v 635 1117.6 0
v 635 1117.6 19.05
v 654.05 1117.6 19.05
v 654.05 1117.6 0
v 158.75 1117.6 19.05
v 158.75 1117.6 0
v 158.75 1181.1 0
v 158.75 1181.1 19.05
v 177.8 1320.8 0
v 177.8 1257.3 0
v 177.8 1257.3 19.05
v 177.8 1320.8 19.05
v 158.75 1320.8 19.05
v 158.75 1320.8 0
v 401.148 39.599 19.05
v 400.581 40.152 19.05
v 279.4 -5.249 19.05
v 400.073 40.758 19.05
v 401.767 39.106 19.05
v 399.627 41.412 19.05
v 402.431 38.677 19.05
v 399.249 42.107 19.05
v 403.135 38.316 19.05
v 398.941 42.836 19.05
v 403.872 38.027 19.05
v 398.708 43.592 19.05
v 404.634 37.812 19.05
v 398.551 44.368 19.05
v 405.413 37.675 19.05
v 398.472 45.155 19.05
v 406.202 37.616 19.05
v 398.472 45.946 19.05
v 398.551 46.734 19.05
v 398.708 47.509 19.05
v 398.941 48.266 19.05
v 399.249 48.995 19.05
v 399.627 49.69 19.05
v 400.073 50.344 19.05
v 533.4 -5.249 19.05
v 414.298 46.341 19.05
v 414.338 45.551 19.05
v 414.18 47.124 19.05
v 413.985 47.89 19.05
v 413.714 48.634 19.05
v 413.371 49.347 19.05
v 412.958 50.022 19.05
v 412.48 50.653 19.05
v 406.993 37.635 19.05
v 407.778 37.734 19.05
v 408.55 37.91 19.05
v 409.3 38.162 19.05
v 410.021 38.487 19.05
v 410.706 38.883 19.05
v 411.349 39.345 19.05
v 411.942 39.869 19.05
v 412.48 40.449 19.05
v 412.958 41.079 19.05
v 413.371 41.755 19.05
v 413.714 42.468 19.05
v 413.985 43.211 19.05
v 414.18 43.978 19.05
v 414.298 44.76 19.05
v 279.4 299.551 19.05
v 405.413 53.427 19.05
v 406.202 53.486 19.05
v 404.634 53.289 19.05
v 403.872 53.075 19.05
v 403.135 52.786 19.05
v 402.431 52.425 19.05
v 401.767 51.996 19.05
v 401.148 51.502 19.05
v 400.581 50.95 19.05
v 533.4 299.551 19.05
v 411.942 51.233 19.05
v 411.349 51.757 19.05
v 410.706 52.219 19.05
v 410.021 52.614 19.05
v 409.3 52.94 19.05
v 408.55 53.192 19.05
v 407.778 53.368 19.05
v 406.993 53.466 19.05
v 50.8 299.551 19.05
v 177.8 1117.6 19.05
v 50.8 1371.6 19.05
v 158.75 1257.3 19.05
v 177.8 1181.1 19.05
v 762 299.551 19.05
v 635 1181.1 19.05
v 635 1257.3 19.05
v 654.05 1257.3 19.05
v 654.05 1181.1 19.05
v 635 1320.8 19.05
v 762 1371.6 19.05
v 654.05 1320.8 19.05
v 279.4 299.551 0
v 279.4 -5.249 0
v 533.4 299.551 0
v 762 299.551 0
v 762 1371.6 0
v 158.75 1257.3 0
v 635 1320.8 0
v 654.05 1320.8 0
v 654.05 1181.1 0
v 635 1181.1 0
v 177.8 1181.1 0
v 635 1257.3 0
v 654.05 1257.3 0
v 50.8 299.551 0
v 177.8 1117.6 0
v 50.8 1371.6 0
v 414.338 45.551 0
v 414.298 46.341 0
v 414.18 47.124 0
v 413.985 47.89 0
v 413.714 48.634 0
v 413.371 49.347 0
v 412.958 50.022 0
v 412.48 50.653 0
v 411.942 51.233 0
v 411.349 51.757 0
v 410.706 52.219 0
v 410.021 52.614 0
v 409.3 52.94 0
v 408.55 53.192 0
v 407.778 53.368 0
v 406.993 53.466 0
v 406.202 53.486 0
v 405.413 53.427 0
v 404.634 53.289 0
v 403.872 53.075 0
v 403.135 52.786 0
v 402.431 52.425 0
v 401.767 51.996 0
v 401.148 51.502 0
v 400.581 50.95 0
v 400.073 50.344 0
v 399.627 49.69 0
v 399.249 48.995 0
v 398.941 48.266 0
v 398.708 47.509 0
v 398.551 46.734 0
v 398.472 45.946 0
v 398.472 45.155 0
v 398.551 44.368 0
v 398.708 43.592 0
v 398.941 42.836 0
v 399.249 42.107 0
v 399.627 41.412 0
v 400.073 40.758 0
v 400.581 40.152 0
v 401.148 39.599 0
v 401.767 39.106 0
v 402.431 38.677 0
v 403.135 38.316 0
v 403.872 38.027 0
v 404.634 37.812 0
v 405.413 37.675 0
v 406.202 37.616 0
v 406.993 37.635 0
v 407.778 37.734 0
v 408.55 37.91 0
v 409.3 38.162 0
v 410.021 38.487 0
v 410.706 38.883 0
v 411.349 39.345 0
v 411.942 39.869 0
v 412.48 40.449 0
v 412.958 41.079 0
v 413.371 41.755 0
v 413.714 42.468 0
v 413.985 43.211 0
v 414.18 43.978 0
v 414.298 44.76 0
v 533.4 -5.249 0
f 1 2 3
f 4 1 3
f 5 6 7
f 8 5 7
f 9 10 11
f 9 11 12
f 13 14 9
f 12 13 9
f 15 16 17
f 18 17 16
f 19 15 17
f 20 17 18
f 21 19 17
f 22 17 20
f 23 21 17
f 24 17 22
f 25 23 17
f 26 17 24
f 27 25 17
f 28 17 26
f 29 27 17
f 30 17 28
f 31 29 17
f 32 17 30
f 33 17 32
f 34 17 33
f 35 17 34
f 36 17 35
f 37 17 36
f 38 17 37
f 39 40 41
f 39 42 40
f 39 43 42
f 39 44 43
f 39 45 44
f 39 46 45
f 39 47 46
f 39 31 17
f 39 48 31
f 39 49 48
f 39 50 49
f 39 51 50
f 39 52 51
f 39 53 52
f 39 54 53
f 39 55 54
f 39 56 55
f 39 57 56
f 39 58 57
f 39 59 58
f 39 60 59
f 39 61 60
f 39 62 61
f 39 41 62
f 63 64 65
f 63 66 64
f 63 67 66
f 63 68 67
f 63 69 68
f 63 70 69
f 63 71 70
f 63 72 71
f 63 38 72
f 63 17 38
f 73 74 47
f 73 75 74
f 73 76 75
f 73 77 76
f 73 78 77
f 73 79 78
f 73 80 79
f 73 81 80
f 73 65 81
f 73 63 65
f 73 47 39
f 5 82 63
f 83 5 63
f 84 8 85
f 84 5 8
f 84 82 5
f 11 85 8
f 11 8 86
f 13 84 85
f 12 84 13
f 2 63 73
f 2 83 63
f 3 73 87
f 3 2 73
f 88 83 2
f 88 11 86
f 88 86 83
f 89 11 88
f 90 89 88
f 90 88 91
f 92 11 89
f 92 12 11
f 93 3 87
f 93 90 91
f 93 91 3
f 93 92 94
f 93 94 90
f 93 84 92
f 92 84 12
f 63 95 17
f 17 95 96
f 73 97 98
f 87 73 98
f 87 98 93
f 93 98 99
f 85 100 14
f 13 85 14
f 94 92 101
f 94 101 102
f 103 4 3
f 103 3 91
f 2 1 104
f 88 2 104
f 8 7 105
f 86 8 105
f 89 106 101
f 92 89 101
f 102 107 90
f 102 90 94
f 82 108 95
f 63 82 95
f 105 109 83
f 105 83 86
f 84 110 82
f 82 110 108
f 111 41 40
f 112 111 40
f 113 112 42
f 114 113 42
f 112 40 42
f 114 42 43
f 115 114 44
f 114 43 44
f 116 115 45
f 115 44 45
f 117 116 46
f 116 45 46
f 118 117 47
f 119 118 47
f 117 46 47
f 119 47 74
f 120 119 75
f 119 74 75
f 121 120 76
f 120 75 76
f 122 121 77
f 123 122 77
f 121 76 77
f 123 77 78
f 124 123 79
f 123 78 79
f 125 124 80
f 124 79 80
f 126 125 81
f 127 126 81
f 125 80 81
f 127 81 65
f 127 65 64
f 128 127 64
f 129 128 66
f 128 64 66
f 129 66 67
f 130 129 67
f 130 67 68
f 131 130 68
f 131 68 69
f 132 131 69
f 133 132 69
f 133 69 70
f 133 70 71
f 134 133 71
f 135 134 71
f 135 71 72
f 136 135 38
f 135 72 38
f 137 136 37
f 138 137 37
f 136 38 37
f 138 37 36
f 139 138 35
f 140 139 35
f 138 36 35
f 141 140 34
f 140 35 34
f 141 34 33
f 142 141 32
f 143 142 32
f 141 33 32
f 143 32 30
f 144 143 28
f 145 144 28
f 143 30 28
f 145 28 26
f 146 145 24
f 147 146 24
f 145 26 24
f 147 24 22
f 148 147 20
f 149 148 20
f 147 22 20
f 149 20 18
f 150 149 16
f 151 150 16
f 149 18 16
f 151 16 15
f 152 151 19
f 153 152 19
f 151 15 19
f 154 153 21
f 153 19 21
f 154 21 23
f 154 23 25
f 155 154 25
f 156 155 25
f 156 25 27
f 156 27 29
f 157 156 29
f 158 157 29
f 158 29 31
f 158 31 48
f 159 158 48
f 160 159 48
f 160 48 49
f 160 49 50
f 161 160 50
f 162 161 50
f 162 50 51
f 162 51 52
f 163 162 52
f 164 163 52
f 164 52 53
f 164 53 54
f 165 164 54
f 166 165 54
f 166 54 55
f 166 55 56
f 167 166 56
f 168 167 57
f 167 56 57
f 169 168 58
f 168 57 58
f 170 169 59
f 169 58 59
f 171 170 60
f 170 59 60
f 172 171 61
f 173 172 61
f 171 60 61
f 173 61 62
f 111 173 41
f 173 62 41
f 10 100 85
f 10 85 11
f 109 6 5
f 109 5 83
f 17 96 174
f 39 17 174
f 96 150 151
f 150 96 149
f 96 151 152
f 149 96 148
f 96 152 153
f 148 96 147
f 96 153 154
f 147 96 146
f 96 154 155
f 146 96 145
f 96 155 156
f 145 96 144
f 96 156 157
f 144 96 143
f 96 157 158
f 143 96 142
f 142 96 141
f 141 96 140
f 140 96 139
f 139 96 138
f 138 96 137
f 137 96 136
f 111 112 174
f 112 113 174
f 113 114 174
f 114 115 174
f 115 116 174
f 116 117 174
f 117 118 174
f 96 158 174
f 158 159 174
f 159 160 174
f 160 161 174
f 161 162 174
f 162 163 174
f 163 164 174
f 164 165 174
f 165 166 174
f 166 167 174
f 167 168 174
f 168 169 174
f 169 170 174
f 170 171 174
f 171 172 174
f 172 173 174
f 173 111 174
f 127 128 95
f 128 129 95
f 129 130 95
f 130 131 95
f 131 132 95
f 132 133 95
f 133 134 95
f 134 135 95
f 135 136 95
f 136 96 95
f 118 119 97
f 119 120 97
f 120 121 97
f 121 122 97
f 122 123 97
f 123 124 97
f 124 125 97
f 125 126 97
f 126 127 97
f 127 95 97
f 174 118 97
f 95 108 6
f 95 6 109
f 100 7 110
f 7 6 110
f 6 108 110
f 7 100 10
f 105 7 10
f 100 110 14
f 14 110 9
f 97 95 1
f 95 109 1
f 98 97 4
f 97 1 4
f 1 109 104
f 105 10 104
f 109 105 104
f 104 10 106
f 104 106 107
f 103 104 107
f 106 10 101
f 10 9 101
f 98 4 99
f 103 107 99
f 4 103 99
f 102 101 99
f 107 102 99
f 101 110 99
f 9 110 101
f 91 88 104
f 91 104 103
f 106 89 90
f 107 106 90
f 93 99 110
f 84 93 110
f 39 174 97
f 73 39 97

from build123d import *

# Parameters (mm, degrees)
F0_W     = 19.05
F0_H     = 63.5
F1_DEPTH = 19.05
F2_R     = 7.9375
F3_DEPTH = 19.05


with BuildPart() as f1:
    # F0 (on Top) → F1 (new body)
    with BuildSketch(Plane.XY):
        Polygon((762, 1371.6), (50.8, 1371.6), (50.8, 299.550803), (279.4, 299.550803), (279.4, 197.950803), (279.4, -5.249197), (533.4, -5.249197), (533.4, 197.950803), (533.4, 299.550803), (762, 299.550803), align=None)
        with Locations((168.275, 1149.35)):
            Rectangle(F0_W, F0_H, mode=Mode.SUBTRACT)
        with Locations((168.275, 1289.05)):
            Rectangle(F0_W, F0_H, mode=Mode.SUBTRACT)
        with Locations((644.525, 1149.35)):
            Rectangle(F0_W, F0_H, mode=Mode.SUBTRACT)
        with Locations((644.525, 1289.05)):
            Rectangle(F0_W, F0_H, mode=Mode.SUBTRACT)
    extrude(amount=F1_DEPTH)

    # F2 (on face) → F3 (cut, through all)
    with BuildSketch(Plane.XY.offset(19.05)):
        with Locations((406.4, 45.550803)):
            Circle(F2_R)
    extrude(amount=-F3_DEPTH, mode=Mode.SUBTRACT)


solid = f1.part
